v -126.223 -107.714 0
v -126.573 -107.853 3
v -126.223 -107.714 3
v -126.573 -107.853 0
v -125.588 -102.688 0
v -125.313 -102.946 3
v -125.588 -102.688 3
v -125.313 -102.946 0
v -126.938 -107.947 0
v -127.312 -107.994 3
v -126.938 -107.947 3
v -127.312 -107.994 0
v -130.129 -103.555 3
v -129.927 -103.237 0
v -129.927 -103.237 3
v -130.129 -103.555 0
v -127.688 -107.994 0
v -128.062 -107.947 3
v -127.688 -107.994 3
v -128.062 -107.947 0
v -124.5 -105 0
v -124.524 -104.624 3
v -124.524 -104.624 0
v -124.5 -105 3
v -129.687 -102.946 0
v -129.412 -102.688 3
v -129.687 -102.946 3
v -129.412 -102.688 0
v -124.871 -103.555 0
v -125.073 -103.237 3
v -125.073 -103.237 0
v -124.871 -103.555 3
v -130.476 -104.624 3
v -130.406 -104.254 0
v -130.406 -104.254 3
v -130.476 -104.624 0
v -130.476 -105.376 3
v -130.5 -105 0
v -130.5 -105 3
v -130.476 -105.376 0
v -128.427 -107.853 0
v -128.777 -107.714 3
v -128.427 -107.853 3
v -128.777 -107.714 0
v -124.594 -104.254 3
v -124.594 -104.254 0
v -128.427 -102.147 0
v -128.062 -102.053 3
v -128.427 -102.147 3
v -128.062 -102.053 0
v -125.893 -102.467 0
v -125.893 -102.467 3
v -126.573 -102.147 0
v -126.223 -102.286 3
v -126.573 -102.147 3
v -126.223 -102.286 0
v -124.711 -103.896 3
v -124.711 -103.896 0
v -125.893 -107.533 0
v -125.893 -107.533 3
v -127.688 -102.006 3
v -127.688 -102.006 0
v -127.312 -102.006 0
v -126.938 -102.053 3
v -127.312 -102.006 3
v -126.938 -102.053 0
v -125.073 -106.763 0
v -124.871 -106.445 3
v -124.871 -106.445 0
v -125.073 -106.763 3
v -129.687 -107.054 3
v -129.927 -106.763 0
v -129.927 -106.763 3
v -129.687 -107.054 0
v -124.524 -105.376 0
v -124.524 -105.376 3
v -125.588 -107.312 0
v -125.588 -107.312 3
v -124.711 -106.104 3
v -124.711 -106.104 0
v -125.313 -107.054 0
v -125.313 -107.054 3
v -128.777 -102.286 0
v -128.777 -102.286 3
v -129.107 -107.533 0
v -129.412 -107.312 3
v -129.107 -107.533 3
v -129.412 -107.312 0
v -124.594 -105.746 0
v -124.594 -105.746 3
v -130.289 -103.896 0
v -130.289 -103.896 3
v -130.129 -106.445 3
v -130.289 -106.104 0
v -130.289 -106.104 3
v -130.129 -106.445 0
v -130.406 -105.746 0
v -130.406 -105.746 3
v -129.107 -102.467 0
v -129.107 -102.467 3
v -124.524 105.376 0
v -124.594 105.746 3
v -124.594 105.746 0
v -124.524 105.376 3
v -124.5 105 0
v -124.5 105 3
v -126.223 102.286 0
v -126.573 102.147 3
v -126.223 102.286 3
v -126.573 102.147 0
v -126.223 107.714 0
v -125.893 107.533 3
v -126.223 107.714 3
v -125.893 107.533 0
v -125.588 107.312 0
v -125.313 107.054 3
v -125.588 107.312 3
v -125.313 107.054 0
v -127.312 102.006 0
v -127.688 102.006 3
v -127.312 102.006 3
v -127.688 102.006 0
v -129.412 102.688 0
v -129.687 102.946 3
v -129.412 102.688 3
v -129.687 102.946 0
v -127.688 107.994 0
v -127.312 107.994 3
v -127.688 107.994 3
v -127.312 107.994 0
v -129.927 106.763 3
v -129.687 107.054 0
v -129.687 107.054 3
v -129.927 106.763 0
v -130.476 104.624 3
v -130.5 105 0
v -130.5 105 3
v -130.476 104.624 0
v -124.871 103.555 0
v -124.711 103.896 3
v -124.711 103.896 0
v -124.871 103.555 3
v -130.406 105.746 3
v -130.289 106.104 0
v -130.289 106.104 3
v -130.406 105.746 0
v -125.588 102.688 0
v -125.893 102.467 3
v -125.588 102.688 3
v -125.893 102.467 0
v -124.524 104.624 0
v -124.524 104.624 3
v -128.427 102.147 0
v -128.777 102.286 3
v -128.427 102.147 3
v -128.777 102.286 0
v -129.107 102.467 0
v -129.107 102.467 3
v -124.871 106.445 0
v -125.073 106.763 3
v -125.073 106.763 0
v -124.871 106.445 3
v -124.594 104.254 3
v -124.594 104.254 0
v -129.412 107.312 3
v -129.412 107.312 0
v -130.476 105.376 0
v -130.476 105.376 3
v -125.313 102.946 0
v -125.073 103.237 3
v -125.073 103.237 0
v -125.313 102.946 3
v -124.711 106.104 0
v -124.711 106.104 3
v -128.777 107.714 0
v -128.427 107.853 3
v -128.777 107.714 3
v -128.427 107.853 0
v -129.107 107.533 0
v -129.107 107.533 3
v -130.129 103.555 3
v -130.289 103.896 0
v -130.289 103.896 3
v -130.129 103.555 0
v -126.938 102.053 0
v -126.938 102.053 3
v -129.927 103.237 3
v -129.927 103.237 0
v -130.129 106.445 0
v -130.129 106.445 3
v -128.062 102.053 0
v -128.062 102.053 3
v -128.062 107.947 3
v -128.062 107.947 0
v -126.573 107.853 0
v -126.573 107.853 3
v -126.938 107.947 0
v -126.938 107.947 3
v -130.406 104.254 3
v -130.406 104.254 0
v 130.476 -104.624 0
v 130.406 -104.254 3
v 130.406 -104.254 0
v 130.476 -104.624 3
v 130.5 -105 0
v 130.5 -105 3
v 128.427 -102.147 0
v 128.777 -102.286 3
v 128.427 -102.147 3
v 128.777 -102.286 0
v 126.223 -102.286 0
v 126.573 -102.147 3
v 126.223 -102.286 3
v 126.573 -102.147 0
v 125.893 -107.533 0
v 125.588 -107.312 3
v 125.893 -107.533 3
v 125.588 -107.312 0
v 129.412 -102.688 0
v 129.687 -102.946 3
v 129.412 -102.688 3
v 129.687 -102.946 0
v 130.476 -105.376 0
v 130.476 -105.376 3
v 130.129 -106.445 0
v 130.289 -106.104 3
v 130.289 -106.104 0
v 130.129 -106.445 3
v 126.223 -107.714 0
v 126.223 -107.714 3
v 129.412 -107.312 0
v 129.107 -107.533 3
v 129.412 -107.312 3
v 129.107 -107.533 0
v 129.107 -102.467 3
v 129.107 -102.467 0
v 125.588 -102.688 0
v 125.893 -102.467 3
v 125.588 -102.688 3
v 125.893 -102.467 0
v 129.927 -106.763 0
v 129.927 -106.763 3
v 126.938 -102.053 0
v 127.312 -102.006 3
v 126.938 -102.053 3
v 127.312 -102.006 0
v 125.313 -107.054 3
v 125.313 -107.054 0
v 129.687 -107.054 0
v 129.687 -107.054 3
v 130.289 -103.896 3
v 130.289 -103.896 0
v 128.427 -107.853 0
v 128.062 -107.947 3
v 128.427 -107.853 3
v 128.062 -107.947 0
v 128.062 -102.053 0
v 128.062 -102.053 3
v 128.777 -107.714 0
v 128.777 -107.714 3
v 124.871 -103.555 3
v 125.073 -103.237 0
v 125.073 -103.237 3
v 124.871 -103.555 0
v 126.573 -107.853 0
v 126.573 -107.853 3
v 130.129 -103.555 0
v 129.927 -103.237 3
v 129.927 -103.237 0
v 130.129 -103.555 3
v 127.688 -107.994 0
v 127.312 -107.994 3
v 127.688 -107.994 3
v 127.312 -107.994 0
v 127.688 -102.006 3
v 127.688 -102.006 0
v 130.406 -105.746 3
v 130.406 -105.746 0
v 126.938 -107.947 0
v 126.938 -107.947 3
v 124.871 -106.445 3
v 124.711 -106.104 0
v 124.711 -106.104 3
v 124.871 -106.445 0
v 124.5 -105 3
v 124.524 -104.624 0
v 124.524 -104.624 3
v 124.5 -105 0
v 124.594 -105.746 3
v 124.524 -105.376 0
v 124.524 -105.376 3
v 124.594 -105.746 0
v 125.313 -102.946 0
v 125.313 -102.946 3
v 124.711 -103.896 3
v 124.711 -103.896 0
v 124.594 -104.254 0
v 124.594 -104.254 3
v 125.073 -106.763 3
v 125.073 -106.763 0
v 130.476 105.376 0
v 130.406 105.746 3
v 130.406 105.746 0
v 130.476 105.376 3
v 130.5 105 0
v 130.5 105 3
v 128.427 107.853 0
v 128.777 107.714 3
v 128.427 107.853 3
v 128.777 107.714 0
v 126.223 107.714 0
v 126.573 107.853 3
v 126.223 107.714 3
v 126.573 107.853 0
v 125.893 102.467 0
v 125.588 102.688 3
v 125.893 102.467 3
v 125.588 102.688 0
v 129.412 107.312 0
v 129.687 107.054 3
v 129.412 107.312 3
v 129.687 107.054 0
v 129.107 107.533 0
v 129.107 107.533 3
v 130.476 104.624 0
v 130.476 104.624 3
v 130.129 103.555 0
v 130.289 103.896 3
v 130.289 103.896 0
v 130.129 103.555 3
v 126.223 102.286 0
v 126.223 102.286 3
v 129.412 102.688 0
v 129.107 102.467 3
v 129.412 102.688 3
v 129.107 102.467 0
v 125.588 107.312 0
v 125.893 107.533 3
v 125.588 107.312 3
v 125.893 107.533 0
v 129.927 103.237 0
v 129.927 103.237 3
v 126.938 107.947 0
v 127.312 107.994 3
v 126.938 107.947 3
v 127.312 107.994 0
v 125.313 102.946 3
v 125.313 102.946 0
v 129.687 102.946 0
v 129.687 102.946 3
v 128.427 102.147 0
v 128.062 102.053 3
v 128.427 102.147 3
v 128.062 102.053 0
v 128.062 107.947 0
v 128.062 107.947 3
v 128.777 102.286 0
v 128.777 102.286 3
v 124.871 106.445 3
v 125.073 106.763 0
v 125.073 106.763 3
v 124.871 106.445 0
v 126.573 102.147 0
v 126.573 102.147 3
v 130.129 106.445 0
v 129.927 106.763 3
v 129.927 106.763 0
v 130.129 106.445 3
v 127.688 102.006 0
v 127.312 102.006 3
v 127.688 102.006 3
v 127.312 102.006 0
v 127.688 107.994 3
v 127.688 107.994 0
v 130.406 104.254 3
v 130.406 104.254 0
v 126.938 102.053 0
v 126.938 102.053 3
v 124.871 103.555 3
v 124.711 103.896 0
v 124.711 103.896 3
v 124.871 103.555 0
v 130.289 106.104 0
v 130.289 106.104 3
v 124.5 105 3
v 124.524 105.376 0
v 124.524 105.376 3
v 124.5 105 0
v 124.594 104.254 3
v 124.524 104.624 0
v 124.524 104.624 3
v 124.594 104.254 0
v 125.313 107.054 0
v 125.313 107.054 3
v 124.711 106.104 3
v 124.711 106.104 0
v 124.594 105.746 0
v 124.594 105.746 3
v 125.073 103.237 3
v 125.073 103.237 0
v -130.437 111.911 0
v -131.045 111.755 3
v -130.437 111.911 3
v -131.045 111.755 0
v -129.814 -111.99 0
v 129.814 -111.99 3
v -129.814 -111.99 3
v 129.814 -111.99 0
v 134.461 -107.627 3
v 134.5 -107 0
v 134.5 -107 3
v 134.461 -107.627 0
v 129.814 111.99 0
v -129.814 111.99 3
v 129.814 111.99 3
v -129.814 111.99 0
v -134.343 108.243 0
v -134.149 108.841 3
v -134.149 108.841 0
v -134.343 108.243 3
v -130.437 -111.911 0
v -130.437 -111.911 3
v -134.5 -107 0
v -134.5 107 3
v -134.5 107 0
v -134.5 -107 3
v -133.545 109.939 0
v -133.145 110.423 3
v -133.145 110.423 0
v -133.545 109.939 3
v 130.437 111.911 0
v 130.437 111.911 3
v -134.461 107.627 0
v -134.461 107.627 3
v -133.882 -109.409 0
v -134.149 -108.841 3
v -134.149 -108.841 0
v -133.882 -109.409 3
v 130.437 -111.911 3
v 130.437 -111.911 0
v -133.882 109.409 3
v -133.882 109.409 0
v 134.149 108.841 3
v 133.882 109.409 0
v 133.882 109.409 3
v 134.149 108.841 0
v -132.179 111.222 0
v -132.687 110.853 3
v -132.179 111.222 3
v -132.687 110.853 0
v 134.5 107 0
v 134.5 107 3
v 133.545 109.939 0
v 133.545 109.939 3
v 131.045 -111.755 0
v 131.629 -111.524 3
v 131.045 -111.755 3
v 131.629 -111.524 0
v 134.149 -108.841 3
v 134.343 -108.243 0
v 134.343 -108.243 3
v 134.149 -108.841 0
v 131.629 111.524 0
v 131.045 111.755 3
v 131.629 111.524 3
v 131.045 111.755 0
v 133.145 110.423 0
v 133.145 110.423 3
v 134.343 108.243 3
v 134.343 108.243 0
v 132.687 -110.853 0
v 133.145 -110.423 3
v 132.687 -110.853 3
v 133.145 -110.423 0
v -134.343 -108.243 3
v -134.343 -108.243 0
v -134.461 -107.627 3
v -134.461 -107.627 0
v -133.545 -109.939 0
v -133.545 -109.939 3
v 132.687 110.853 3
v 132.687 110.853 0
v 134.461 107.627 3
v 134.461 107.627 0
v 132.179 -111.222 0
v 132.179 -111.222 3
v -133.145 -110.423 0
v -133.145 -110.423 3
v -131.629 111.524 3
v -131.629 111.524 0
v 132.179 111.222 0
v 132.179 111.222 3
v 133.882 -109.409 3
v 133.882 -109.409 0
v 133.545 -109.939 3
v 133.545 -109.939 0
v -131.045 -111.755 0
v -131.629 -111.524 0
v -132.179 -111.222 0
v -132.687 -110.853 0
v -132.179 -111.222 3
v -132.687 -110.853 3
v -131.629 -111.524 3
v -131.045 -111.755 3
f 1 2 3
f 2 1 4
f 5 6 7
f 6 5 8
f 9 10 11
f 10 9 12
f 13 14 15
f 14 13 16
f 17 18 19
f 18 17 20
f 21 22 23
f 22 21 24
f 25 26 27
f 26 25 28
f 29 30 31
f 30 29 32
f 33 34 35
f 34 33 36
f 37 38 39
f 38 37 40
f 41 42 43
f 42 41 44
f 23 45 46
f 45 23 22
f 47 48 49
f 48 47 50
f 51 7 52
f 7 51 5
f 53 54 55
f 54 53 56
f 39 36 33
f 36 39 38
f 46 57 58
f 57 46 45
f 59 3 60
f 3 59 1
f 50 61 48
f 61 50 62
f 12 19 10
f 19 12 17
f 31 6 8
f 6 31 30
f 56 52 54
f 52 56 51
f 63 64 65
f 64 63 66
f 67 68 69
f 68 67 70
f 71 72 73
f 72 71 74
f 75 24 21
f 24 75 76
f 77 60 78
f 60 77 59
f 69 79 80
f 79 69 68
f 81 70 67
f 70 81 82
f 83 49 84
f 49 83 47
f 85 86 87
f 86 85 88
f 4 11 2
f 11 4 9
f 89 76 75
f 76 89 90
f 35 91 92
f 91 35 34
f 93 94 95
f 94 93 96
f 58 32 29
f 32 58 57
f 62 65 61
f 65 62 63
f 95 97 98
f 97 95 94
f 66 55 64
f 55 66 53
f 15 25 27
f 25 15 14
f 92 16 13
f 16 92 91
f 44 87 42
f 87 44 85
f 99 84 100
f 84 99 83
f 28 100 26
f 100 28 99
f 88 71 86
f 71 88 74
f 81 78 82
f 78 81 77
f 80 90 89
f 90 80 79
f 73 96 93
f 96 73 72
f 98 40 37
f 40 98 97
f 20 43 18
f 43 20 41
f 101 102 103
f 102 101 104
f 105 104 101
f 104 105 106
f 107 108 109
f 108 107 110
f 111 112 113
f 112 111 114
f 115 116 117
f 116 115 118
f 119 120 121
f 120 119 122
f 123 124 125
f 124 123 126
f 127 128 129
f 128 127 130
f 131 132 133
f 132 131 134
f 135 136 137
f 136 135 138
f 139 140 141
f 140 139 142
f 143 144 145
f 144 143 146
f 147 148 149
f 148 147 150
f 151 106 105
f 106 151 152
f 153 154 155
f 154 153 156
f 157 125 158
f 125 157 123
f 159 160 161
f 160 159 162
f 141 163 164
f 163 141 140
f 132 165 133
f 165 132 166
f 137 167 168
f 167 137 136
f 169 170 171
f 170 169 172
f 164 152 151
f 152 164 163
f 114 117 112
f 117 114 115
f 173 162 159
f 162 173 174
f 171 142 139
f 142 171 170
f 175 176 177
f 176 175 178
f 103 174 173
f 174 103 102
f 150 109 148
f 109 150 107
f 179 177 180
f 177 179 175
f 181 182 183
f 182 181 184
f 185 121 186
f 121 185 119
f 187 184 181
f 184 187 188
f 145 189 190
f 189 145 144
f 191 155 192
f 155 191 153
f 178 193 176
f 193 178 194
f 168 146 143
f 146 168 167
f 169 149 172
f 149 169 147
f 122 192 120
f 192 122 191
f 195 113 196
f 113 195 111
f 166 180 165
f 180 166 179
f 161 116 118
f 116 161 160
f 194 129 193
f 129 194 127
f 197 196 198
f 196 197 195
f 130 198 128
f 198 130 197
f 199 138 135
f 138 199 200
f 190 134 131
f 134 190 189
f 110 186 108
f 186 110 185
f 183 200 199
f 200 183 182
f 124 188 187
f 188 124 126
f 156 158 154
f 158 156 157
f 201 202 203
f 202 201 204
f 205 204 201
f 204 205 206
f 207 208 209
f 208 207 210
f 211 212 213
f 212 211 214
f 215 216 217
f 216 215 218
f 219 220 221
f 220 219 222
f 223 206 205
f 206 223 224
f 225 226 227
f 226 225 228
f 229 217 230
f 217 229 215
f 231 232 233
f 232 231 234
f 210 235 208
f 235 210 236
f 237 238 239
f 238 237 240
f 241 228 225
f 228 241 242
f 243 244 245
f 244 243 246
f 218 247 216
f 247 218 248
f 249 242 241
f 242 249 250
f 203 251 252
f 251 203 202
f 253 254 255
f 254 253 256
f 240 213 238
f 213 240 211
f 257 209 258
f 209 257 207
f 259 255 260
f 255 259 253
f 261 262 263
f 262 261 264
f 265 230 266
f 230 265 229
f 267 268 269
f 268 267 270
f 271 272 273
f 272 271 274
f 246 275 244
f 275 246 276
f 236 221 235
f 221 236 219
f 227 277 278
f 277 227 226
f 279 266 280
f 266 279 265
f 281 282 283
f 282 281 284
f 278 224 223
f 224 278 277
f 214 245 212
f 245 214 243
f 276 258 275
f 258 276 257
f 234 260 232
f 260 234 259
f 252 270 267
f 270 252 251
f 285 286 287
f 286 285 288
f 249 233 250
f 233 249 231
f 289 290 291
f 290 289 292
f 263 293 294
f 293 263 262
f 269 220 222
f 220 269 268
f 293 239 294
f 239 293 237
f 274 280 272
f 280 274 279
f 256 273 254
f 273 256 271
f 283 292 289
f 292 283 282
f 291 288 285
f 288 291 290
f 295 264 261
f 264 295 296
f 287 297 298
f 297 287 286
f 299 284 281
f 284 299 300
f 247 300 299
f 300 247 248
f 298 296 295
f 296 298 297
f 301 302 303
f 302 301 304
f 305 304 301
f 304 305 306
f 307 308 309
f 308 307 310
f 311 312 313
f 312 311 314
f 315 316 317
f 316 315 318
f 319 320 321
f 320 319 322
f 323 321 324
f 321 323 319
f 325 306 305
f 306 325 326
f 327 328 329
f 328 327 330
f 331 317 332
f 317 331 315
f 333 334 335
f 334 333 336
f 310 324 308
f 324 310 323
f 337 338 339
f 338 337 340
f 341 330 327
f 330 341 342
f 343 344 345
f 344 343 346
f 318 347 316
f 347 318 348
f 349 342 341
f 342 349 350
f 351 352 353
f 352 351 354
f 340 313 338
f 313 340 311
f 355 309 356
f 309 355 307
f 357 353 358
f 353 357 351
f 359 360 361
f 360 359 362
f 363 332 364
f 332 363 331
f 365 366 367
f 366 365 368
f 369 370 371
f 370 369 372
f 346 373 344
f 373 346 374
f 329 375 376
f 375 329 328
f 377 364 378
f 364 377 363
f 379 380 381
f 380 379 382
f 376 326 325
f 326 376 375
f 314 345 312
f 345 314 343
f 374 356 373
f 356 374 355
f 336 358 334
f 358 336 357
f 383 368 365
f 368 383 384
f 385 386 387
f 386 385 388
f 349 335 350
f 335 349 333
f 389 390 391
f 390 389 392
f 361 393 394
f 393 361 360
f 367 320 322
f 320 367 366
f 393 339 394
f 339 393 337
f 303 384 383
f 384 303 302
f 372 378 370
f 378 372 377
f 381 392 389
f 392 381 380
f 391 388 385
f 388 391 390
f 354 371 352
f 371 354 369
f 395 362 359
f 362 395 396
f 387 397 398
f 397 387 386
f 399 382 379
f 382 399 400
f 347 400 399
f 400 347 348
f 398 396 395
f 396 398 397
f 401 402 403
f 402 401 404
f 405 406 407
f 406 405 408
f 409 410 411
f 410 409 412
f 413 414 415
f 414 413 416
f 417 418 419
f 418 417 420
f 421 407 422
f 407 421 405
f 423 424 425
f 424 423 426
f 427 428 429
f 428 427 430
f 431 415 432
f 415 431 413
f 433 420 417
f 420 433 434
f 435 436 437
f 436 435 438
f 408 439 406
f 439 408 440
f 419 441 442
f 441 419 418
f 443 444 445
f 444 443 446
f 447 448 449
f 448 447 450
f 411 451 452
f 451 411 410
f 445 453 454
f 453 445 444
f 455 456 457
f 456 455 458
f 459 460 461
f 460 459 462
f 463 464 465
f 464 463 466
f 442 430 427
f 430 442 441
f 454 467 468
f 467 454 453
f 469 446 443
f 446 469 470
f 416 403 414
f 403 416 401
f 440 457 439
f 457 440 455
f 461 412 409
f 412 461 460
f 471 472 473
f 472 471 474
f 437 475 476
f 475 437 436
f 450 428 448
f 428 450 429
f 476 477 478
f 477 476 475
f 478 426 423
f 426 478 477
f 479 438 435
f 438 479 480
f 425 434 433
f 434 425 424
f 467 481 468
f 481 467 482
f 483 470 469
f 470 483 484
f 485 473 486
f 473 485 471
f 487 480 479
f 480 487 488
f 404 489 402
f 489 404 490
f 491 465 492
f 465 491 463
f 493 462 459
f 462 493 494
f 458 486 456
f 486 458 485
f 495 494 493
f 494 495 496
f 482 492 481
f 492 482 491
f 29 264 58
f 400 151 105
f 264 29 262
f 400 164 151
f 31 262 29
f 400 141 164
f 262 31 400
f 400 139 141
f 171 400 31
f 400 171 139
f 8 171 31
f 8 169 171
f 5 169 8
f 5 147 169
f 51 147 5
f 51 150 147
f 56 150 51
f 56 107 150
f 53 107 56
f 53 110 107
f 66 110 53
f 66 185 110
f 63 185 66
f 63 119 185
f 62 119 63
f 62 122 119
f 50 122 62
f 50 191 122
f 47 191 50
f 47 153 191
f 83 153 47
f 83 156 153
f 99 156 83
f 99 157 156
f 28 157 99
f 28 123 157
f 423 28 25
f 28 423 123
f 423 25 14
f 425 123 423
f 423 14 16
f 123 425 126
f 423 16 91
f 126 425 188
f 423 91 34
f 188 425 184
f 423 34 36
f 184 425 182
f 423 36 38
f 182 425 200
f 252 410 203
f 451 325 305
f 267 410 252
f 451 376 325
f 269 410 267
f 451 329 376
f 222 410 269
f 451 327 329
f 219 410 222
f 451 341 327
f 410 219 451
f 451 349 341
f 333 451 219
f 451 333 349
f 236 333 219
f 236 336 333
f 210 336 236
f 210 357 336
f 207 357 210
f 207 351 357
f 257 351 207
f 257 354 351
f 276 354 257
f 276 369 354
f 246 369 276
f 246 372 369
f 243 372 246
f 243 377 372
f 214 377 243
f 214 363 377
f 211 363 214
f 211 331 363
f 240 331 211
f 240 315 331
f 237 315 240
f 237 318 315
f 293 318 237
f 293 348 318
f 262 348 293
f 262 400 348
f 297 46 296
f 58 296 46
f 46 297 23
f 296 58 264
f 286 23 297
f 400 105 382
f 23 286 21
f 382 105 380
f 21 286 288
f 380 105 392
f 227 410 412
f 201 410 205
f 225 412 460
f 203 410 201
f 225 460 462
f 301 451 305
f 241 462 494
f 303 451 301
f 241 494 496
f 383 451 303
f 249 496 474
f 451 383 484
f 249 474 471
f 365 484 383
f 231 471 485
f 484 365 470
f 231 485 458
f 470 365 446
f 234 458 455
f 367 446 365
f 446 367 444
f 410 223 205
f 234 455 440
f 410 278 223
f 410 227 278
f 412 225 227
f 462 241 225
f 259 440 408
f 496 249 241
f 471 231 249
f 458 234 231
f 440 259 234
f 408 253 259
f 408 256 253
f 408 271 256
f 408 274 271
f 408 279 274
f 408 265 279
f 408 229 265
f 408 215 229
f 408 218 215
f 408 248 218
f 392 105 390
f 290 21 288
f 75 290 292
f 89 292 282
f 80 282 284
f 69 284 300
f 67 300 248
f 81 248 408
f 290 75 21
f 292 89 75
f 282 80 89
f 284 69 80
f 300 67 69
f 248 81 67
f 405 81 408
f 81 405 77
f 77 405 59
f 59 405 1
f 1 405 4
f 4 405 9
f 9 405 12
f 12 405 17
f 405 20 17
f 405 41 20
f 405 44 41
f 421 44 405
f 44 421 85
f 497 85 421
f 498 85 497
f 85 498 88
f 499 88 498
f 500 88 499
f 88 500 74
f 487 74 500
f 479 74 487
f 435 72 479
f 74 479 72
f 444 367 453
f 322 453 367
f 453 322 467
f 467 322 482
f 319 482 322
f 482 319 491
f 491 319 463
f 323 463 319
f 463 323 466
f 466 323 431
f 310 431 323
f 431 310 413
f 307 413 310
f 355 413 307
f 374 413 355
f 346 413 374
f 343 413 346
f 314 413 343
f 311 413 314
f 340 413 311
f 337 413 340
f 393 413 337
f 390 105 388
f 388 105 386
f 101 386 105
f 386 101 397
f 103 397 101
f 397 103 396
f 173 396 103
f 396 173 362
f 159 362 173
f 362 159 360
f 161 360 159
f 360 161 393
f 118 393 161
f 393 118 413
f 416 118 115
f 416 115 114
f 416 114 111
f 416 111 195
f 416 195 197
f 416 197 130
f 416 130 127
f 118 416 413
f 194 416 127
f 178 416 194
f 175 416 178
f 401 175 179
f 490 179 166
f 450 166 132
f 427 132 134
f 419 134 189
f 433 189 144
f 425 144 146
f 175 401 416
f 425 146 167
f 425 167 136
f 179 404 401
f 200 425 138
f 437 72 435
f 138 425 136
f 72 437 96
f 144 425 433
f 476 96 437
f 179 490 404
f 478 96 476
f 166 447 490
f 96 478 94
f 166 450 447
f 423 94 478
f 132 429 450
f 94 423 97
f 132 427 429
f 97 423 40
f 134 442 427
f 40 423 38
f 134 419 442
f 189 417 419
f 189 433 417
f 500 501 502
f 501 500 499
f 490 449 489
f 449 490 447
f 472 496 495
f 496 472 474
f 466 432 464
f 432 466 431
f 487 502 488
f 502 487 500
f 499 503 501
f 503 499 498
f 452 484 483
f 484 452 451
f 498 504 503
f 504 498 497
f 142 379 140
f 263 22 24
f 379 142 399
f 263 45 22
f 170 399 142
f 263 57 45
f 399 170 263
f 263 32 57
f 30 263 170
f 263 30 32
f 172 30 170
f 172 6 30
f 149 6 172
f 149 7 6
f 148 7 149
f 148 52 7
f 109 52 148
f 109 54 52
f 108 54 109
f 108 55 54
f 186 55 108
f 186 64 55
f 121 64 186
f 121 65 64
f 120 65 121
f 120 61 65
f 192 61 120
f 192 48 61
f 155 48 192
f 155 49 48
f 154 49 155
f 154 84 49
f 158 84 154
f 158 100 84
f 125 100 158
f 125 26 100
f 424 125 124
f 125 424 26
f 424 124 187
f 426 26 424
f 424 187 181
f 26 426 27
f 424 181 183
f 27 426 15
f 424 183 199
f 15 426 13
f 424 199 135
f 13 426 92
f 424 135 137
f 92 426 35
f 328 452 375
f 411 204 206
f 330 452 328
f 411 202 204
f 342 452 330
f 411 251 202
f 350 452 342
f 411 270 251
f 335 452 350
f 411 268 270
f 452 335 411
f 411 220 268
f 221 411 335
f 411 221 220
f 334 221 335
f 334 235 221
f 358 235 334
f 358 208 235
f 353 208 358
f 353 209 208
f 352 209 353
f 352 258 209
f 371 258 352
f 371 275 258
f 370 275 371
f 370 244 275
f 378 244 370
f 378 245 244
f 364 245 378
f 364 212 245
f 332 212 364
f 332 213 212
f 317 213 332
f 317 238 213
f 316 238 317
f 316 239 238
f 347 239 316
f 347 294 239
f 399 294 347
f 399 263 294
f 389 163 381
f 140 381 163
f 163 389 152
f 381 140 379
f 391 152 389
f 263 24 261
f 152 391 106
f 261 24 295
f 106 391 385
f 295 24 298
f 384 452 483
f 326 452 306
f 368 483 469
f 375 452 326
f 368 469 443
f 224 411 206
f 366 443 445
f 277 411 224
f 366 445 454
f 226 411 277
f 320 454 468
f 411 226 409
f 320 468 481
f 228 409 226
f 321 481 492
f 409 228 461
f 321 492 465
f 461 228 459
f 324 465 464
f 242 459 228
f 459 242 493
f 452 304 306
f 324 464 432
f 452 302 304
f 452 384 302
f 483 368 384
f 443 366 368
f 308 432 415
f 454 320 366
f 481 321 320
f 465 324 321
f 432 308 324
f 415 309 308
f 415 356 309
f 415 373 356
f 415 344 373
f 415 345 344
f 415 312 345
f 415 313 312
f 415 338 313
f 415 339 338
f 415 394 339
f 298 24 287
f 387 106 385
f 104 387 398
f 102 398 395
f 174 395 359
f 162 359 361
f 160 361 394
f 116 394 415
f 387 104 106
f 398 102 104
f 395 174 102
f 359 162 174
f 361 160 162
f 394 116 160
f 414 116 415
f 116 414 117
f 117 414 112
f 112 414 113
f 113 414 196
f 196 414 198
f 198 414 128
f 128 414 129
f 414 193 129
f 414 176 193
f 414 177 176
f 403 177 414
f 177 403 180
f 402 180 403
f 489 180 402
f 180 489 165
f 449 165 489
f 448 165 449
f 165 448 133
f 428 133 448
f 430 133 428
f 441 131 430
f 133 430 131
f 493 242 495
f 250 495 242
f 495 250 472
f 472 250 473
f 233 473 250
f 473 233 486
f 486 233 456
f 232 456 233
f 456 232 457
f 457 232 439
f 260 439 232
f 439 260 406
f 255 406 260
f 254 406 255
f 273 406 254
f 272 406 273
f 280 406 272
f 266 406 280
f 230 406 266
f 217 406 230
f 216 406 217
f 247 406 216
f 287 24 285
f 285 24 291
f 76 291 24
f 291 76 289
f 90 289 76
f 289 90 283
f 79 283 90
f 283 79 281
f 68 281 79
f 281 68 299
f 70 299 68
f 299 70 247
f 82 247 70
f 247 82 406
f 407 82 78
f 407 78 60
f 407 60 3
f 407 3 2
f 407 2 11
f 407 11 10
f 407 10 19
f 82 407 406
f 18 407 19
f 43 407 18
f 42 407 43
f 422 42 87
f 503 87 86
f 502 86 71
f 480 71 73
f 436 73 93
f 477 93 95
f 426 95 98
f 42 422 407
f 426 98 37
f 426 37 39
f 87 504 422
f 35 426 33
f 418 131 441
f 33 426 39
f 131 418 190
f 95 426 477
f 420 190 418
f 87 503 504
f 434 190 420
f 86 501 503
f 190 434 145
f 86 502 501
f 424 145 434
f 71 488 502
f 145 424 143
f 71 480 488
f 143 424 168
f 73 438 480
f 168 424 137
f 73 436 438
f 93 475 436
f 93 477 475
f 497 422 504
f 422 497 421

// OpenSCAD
$fn = 50;


difference() {
	union() {
		hull() {
			translate(v = [-129.5000000000, 107.0000000000, 0]) {
				cylinder(h = 3, r = 5);
			}
			translate(v = [129.5000000000, 107.0000000000, 0]) {
				cylinder(h = 3, r = 5);
			}
			translate(v = [-129.5000000000, -107.0000000000, 0]) {
				cylinder(h = 3, r = 5);
			}
			translate(v = [129.5000000000, -107.0000000000, 0]) {
				cylinder(h = 3, r = 5);
			}
		}
	}
	union() {
		translate(v = [-127.5000000000, -105.0000000000, -100.0000000000]) {
			cylinder(h = 200, r = 3.0000000000);
		}
		translate(v = [-127.5000000000, 105.0000000000, -100.0000000000]) {
			cylinder(h = 200, r = 3.0000000000);
		}
		translate(v = [127.5000000000, -105.0000000000, -100.0000000000]) {
			cylinder(h = 200, r = 3.0000000000);
		}
		translate(v = [127.5000000000, 105.0000000000, -100.0000000000]) {
			cylinder(h = 200, r = 3.0000000000);
		}
	}
}
